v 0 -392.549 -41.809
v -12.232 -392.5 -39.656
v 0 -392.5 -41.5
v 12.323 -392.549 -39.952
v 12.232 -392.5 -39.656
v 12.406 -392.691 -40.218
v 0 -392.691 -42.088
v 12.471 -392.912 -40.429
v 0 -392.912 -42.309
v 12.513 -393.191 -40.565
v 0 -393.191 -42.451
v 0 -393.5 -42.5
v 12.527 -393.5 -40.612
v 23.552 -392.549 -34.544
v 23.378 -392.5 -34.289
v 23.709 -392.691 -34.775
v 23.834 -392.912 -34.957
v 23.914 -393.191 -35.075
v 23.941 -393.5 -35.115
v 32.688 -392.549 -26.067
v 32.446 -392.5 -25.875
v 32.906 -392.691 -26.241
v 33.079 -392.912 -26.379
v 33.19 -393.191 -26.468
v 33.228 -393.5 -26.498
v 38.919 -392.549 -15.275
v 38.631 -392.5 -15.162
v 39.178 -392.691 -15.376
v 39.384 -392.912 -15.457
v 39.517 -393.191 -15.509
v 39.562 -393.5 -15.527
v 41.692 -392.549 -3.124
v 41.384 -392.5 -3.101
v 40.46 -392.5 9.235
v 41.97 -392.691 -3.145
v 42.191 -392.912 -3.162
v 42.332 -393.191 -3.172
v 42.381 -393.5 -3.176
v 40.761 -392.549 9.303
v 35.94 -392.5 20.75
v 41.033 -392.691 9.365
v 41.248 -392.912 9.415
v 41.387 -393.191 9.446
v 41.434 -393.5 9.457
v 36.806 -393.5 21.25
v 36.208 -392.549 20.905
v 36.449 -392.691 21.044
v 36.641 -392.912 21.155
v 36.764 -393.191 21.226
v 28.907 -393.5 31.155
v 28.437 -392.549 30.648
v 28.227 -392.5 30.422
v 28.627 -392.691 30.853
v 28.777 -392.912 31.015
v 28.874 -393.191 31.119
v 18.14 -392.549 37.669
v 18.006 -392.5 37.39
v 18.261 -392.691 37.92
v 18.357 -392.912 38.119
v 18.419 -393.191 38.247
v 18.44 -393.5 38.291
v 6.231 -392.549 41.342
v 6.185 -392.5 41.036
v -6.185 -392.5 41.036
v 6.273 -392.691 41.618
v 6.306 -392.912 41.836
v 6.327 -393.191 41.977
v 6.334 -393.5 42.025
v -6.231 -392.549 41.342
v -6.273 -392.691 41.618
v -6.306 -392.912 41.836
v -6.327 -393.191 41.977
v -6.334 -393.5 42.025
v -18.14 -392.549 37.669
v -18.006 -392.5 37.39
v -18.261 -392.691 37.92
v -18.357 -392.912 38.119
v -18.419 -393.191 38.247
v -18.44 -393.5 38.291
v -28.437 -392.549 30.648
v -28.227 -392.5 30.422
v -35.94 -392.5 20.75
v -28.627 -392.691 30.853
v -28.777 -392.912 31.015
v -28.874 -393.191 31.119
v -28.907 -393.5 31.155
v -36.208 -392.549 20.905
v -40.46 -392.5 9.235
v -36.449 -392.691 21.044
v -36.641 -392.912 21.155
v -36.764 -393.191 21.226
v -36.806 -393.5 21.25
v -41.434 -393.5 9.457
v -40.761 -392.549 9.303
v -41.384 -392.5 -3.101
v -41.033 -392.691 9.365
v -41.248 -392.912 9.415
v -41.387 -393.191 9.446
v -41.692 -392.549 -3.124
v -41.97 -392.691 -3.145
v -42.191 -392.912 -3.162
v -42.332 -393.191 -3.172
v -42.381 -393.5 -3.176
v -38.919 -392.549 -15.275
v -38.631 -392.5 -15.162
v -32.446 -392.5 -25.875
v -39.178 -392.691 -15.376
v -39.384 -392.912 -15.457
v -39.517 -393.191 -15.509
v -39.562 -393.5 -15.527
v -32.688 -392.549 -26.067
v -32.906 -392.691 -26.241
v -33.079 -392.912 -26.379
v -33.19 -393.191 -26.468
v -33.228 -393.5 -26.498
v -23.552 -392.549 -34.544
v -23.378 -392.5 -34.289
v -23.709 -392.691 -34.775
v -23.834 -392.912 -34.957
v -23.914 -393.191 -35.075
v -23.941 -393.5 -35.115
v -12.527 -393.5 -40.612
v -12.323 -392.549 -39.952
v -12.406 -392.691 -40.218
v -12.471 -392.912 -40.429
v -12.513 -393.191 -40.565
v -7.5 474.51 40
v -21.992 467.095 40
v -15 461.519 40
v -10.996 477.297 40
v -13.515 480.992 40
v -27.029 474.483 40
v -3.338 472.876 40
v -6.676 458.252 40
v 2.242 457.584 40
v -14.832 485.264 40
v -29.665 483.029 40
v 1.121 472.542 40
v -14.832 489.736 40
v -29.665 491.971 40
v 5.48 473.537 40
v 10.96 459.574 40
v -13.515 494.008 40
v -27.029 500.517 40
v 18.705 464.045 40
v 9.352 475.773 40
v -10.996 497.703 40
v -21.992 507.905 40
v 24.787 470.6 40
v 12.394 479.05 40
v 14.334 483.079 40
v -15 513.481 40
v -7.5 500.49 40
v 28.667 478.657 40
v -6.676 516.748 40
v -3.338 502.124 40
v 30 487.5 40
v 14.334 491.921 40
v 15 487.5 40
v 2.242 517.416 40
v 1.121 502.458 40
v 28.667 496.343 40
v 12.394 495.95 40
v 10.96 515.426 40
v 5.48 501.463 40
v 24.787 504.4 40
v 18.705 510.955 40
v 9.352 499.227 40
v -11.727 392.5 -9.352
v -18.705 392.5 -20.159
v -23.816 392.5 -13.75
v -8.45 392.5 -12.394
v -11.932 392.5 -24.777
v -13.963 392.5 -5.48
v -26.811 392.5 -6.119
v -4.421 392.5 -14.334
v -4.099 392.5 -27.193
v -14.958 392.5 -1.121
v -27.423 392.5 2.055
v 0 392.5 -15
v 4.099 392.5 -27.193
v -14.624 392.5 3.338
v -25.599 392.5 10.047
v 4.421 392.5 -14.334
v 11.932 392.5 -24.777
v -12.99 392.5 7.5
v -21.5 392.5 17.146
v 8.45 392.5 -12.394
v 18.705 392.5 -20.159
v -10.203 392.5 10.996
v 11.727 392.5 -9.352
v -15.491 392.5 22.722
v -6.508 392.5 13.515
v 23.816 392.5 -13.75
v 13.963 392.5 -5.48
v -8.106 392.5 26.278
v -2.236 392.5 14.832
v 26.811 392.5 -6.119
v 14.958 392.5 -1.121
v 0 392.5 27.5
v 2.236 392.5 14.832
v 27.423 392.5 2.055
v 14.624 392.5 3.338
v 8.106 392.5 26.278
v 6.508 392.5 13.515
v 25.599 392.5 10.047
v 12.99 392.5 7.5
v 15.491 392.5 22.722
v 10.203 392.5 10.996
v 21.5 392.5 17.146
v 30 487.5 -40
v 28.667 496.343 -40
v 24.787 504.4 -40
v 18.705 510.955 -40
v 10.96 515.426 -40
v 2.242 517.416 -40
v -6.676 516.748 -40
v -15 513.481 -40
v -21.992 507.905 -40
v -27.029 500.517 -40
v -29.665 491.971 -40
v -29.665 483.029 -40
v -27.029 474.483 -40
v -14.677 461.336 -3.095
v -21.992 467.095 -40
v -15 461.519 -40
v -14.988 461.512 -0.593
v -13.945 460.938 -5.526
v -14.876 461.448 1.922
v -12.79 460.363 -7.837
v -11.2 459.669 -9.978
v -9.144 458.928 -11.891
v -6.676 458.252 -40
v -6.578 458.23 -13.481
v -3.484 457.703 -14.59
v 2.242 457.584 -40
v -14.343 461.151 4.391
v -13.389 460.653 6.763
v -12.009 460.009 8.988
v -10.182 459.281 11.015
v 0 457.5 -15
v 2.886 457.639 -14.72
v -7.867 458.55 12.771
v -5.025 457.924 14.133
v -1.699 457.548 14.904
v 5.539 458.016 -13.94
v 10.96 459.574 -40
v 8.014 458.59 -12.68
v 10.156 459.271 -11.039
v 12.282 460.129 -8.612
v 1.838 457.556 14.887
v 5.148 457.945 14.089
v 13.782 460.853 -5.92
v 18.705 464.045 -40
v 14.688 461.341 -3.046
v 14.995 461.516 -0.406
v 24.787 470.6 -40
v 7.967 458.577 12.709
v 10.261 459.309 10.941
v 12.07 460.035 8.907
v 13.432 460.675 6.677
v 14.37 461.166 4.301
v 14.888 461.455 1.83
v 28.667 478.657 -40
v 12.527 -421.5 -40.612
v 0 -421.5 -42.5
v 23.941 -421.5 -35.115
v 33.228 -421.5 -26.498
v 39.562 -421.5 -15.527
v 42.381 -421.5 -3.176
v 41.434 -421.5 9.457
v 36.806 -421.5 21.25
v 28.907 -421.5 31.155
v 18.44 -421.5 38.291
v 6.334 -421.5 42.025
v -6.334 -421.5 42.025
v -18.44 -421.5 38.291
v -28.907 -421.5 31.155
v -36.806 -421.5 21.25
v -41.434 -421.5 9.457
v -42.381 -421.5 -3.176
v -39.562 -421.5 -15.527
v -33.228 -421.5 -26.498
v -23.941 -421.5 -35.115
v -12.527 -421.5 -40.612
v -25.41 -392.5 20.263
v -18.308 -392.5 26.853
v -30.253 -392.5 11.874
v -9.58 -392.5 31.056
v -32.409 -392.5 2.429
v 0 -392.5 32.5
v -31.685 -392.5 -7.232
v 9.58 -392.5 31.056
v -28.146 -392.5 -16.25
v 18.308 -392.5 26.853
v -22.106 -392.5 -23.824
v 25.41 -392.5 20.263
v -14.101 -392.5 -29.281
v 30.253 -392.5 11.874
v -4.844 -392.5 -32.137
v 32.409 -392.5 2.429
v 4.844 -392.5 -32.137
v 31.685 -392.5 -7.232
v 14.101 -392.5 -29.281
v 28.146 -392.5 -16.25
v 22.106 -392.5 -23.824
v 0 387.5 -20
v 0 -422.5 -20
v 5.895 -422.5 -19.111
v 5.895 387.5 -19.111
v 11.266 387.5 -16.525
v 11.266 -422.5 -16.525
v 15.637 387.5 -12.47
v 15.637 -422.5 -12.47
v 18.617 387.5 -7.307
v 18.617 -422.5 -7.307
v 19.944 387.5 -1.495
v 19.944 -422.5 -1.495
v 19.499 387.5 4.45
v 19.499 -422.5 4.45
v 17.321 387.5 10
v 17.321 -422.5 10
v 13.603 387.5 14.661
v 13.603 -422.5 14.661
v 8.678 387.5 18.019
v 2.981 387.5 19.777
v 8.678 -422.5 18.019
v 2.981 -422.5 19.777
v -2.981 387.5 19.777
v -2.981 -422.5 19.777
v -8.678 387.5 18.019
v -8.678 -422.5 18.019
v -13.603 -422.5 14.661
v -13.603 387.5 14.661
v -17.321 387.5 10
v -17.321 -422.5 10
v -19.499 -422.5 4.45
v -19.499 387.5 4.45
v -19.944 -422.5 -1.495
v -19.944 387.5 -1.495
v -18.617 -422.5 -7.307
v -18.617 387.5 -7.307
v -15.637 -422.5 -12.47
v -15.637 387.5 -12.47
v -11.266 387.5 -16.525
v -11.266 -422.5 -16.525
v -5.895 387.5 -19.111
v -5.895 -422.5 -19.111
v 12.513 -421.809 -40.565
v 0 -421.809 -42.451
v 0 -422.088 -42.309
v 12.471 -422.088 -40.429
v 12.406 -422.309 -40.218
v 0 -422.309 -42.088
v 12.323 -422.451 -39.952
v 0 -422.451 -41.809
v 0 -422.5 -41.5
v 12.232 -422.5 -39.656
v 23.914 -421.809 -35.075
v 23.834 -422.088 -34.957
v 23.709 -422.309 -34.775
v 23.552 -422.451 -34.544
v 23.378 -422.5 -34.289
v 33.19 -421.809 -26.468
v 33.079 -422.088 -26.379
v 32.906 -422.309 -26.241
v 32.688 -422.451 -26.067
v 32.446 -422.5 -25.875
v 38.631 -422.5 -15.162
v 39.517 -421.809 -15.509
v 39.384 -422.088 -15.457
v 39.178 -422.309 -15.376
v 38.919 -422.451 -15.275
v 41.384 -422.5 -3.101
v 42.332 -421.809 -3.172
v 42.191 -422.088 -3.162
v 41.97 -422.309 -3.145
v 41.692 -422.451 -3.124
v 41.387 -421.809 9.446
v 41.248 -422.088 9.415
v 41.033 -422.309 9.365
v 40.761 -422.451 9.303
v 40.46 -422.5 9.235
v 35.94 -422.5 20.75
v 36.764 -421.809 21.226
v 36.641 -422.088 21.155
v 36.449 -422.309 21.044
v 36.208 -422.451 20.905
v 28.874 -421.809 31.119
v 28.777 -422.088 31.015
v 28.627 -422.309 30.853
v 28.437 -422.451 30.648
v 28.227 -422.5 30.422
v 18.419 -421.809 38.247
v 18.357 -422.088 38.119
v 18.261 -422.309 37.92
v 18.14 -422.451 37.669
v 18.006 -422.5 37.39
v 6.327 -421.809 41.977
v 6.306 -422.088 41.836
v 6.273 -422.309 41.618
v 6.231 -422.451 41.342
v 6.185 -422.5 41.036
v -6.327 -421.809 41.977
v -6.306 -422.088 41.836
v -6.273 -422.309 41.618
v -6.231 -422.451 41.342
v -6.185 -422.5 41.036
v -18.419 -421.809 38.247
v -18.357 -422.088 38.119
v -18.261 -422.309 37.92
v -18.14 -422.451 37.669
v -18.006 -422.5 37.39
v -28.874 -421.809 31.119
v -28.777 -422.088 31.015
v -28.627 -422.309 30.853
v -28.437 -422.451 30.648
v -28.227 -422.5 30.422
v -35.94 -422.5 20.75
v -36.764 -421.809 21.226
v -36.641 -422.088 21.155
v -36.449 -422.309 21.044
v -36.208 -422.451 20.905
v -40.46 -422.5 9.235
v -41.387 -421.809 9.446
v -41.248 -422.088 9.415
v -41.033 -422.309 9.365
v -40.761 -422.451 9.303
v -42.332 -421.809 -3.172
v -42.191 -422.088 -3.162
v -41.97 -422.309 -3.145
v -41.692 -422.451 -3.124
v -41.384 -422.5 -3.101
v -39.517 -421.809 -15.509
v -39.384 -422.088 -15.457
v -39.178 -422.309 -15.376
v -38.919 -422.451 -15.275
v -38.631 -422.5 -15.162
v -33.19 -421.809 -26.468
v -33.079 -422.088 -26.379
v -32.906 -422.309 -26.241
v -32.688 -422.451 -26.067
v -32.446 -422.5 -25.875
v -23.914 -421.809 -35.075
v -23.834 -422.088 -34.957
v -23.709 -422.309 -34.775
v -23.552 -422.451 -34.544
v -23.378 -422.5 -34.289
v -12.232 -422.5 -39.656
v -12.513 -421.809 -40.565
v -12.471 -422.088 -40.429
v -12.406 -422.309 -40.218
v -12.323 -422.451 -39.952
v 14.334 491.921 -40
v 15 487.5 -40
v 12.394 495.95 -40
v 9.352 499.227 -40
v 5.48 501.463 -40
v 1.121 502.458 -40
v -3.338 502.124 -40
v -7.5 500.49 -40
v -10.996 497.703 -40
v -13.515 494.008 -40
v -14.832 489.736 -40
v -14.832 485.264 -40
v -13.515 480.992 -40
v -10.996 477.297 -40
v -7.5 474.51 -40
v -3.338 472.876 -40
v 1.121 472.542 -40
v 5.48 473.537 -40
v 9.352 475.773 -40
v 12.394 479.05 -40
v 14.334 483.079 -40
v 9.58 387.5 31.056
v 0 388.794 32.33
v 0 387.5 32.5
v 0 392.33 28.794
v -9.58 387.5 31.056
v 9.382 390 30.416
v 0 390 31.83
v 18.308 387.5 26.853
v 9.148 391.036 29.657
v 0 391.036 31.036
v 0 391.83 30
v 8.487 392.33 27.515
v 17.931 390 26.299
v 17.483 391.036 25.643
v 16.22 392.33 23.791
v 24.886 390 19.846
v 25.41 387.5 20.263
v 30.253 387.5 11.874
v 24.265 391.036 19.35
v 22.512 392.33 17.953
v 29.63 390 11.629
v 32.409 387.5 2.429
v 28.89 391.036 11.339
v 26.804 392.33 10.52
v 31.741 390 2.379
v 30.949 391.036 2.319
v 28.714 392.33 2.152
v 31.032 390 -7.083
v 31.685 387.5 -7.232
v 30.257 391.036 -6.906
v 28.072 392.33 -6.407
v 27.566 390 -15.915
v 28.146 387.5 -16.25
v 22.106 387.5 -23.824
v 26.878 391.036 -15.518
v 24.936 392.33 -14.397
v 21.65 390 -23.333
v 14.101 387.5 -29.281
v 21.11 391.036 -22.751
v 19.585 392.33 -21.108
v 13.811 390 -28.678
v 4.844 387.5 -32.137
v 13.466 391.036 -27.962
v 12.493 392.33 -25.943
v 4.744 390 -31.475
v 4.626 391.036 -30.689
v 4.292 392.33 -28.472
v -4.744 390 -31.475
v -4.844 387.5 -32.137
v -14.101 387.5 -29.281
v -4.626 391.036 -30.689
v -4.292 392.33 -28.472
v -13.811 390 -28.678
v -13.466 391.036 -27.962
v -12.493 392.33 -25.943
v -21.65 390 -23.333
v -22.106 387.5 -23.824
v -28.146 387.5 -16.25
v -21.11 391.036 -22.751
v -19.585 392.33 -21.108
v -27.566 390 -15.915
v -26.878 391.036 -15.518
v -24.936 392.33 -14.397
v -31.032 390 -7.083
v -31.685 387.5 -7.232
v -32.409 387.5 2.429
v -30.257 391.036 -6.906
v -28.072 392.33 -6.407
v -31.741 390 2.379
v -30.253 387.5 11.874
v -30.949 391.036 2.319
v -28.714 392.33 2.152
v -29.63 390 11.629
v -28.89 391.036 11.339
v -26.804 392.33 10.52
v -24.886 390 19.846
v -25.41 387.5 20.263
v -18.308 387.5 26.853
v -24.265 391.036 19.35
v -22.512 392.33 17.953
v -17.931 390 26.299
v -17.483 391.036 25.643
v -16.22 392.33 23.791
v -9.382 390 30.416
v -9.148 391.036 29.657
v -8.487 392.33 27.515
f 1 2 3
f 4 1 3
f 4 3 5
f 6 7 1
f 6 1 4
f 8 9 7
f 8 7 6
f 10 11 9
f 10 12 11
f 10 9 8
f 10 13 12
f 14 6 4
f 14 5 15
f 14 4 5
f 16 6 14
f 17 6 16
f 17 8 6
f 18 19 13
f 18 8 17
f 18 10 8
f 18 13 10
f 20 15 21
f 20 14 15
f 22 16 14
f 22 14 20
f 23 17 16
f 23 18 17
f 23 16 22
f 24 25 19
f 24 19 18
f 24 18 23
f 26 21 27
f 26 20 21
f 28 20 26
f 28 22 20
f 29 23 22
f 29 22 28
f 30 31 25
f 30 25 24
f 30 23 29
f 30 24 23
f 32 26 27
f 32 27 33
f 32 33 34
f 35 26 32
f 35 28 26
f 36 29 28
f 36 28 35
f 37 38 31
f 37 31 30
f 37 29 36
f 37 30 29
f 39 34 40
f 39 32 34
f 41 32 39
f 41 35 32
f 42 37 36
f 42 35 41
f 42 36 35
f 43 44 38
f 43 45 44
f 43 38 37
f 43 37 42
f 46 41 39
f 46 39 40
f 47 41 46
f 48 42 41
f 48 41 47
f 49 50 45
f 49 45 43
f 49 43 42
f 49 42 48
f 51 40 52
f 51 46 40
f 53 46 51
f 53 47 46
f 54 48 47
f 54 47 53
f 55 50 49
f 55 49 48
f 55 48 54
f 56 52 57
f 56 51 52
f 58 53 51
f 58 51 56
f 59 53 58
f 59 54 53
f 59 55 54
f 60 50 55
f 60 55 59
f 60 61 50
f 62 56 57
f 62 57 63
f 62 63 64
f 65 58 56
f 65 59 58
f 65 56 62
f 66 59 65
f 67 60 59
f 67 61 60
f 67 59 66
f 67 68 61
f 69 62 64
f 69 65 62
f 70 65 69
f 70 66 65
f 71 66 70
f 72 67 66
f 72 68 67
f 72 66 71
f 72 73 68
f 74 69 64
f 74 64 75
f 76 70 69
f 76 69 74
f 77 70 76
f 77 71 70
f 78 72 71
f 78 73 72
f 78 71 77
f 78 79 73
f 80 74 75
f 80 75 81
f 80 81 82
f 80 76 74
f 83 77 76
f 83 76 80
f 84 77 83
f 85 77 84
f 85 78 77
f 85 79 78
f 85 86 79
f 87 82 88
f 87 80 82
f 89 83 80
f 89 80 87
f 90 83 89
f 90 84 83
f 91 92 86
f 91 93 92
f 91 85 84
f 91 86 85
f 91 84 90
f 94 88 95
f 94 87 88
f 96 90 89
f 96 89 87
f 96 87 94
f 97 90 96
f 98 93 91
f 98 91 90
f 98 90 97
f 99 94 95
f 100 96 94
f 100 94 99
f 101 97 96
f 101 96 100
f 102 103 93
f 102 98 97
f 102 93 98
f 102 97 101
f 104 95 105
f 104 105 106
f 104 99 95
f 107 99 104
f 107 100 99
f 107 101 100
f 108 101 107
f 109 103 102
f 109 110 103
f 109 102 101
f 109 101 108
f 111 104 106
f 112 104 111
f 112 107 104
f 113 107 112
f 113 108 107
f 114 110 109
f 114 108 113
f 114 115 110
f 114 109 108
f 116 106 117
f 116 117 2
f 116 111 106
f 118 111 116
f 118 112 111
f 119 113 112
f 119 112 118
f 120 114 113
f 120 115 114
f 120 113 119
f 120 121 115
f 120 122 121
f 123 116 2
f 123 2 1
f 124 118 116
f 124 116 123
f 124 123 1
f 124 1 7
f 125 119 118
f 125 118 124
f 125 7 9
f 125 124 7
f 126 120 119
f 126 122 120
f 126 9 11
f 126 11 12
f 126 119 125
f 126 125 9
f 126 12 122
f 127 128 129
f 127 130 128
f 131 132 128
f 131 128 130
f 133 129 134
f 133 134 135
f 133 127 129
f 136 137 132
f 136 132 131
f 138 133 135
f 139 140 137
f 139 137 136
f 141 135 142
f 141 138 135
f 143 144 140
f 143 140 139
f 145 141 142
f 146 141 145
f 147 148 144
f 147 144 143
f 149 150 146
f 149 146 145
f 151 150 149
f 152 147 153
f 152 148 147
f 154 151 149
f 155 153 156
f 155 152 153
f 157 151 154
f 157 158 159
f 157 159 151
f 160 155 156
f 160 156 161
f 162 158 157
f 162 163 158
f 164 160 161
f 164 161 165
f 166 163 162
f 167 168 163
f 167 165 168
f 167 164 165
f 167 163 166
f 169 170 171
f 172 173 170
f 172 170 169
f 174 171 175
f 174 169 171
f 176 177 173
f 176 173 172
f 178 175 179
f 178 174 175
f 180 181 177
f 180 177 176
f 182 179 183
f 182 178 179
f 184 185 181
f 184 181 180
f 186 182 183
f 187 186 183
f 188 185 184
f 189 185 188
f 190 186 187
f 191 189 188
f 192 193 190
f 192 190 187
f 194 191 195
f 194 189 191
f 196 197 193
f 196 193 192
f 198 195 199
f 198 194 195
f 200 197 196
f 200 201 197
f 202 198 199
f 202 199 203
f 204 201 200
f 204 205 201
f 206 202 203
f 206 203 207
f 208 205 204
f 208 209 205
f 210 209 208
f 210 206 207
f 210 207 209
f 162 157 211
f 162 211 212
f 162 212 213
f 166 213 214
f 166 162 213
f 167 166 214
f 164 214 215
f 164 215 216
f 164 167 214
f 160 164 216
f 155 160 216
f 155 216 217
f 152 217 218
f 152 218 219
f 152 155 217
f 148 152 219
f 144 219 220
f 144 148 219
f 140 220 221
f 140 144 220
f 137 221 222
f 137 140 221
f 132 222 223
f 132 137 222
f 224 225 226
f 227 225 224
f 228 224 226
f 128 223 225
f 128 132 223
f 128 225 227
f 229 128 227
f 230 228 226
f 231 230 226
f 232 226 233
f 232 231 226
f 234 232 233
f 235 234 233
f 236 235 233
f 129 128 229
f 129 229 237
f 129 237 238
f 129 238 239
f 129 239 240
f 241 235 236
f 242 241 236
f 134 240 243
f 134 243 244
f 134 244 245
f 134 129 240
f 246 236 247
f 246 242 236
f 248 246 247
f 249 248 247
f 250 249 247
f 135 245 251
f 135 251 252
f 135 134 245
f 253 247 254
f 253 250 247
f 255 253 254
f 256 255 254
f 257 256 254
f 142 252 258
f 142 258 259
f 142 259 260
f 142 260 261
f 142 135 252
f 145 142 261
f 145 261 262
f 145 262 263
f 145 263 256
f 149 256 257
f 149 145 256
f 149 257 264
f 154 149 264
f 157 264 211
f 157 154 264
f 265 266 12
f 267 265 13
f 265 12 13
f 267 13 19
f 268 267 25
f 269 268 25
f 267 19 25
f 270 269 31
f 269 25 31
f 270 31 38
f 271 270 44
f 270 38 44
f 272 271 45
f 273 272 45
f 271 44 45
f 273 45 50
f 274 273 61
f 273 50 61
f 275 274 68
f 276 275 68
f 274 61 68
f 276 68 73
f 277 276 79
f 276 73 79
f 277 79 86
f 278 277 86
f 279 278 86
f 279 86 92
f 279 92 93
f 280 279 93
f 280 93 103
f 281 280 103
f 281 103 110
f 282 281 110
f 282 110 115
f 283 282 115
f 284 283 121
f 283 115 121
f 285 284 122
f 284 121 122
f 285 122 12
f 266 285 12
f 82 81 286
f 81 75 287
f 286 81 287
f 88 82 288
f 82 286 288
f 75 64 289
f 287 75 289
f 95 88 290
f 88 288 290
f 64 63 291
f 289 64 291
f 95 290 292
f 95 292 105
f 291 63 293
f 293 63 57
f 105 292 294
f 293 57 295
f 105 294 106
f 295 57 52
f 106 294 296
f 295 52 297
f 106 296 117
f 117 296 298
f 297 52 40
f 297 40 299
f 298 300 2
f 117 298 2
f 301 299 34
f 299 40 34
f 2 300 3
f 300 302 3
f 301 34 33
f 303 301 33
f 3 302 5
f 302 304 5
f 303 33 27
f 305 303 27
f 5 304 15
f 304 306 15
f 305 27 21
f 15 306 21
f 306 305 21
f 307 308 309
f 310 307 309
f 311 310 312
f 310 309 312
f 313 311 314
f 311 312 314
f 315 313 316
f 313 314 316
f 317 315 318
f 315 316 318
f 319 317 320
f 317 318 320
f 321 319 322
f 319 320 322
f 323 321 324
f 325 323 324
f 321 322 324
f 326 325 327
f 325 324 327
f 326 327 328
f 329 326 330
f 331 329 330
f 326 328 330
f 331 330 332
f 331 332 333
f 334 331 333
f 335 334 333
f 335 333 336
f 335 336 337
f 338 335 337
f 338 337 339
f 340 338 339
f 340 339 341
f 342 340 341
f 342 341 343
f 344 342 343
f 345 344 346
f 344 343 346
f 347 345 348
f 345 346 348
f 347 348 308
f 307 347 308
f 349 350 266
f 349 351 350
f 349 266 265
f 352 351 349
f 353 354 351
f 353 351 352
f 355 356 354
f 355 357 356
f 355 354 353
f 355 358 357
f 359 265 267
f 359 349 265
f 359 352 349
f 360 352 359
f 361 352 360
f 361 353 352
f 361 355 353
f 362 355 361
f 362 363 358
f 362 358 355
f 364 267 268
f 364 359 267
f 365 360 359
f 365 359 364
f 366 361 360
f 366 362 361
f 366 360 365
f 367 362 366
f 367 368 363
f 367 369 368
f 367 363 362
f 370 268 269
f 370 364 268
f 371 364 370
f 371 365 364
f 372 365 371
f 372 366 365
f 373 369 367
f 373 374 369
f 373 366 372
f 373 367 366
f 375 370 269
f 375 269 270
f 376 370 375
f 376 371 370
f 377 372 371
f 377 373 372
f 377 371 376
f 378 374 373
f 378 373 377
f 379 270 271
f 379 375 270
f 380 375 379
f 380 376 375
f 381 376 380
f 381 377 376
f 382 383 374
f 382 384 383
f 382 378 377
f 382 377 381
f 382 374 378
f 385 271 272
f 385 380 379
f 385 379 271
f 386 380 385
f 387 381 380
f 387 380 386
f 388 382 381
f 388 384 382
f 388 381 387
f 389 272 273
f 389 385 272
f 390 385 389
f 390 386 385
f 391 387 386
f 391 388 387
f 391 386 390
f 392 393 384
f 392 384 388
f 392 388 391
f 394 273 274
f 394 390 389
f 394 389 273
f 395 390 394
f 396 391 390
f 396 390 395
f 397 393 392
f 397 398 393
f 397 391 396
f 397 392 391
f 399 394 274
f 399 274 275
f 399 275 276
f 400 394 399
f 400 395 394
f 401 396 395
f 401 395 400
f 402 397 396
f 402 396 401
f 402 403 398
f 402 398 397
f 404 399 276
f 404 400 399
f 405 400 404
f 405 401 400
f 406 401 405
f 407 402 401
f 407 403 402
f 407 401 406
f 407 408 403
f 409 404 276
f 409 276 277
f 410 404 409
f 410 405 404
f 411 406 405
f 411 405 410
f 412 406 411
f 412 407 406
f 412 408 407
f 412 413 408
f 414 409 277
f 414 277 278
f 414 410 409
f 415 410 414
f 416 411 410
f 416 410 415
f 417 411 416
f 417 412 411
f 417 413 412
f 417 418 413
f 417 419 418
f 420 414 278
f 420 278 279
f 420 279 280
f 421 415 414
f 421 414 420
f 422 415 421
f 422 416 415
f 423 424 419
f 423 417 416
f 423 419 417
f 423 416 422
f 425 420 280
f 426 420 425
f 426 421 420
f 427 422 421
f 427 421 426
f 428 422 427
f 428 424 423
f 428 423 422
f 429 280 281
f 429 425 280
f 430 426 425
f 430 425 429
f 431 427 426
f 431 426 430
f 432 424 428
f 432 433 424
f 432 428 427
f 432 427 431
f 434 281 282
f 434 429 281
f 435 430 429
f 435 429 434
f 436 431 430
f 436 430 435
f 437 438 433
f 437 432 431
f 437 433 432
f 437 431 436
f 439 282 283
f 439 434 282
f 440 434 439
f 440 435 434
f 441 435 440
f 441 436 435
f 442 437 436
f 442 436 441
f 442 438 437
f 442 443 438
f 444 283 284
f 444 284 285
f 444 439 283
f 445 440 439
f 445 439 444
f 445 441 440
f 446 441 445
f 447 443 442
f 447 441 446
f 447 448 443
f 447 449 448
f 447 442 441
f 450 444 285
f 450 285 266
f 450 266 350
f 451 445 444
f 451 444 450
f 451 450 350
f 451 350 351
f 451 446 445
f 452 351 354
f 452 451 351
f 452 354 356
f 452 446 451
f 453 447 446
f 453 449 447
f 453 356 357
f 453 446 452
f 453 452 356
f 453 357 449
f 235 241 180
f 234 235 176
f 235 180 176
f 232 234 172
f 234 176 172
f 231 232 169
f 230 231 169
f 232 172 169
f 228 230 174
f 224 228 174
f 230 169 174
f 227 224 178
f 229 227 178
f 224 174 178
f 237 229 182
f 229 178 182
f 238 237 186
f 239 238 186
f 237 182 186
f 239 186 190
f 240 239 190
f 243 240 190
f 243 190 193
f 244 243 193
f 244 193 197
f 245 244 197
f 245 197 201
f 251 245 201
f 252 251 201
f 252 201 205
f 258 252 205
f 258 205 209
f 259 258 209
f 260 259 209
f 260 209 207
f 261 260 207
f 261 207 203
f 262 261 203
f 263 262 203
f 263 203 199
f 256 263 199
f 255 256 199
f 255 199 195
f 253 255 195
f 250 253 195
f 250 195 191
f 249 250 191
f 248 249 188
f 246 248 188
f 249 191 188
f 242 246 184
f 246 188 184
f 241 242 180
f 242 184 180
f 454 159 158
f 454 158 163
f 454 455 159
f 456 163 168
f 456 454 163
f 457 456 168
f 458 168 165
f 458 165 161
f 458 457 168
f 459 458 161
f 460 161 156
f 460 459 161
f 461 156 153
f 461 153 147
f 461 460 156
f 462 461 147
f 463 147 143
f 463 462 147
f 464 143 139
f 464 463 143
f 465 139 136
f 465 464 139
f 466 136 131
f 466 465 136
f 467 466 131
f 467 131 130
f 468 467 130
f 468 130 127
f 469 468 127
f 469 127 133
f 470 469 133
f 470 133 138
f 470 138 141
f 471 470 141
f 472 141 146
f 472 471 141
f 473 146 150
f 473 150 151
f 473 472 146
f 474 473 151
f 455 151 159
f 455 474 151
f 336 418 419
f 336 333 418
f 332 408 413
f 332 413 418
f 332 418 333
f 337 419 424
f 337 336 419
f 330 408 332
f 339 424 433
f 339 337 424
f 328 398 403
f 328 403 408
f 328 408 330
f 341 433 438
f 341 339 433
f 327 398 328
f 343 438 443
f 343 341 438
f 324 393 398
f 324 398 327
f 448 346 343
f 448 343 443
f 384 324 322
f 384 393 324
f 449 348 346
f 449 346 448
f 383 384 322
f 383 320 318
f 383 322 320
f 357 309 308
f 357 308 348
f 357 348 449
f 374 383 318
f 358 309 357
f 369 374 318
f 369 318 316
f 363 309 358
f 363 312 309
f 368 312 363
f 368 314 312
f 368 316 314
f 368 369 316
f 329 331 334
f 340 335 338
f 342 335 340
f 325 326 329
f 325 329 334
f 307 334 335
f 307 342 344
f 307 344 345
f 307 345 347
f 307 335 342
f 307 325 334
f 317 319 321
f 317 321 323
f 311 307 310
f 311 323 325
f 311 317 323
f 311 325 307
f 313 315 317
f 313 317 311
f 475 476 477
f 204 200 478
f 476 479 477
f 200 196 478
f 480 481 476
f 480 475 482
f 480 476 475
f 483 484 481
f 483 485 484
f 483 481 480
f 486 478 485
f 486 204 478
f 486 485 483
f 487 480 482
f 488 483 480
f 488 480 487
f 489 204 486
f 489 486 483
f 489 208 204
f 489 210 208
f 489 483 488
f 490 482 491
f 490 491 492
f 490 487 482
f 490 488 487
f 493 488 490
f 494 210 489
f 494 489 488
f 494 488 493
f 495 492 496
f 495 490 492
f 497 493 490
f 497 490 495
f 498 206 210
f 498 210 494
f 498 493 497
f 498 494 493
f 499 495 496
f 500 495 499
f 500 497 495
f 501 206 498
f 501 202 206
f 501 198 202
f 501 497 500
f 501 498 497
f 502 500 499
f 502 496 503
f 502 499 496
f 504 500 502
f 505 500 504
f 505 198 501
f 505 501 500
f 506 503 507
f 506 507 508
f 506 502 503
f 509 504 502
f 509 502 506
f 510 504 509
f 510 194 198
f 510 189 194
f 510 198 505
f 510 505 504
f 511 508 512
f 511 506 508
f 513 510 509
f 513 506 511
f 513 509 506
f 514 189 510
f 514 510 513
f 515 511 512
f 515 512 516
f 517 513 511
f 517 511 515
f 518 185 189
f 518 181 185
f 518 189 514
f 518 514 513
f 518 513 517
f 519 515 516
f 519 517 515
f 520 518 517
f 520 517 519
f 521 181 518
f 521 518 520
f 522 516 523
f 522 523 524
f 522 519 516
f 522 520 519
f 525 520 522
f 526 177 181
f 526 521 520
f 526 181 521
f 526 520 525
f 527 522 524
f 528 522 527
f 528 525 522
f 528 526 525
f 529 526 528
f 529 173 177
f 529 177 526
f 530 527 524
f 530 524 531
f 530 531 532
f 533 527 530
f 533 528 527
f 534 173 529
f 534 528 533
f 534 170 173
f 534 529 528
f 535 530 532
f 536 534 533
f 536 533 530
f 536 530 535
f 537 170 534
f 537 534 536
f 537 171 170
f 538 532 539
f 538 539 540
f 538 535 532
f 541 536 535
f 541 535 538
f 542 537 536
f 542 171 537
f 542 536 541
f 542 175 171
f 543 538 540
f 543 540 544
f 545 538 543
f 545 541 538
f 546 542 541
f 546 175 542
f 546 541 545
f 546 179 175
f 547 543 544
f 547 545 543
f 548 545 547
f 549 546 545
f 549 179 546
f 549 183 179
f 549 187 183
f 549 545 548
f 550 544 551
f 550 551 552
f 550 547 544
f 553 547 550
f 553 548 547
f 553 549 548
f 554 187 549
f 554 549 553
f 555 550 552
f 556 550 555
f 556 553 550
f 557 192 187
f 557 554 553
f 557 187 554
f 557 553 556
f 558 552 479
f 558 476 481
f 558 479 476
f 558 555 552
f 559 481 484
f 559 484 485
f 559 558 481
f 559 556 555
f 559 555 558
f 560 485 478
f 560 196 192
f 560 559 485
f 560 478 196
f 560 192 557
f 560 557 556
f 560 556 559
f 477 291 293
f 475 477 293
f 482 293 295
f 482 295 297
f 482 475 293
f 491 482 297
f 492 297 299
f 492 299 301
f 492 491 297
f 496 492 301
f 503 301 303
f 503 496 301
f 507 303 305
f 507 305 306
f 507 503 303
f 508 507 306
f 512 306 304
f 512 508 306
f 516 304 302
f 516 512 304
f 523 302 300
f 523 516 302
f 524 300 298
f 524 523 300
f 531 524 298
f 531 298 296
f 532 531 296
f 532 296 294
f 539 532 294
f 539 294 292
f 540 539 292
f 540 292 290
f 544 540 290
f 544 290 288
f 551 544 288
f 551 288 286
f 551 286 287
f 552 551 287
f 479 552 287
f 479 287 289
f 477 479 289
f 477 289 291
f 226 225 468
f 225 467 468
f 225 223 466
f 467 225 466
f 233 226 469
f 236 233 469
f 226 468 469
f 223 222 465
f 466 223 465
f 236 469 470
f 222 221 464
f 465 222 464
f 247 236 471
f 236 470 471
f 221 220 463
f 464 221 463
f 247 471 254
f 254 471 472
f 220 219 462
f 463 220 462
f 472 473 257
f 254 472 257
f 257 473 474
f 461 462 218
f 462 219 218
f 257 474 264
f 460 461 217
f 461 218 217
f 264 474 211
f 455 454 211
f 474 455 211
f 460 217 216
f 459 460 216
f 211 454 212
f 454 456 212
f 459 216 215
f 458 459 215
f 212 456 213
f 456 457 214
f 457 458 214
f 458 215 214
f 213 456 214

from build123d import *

# Parameters (mm, degrees)
SKETCH1_R                = 32.5
BOSS_EXTRUDE1_DEPTH      = 392.5
FILLET1_R                = 5
SKETCH2_R                = 42.5
BOSS_EXTRUDE2_DEPTH      = 30
SKETCH3_R                = 20
CUT_EXTRUDE1_DEPTH       = 810
SKETCH4_R                = 30
SKETCH4_R_2              = 15
BOSS_EXTRUDE3_DEPTH      = 40
BOSS_EXTRUDE4_REACH      = 819.213
BOSS_EXTRUDE4_END_RADIUS = 30
SKETCH5_R                = 15
FILLET2_R                = 1


with BuildPart() as part:
    # Sketch1 → Boss-Extrude1 (new, symmetric)
    with BuildSketch(Plane(origin=(0, 0, 0), x_dir=(1, 0, 0), z_dir=(0, 1, 0))):
        with Locations(Location((0, 0, 0), (0, 0, 270))):
            Circle(SKETCH1_R)
    extrude(amount=BOSS_EXTRUDE1_DEPTH, both=True)

    # Fillet1
    fillet1_edges = [part.edges().sort_by_distance(p)[0] for p in [
        (0, 392.5, -32.5),
    ]]
    fillet(fillet1_edges, radius=FILLET1_R)

    # Sketch2 → Boss-Extrude2 (add)
    with BuildSketch(Plane.XZ.offset(392.5)):
        with Locations(Location((0, 0, 0), (0, 0, 270))):
            Circle(SKETCH2_R)
    extrude(amount=BOSS_EXTRUDE2_DEPTH)

    # Sketch3 → Cut-Extrude1 (cut)
    with BuildSketch(Plane.XZ.offset(422.5)):
        with Locations(Location((0, 0, 0), (0, 0, 270))):
            Circle(SKETCH3_R)
    extrude(amount=-CUT_EXTRUDE1_DEPTH, mode=Mode.SUBTRACT)



with BuildPart() as body_2:
    # Sketch4 → Boss-Extrude3 (new, symmetric)
    with BuildSketch(Plane.XY):
        with Locations((0, 487.5)):
            Circle(SKETCH4_R)
        with Locations((0, 487.5)):
            Circle(SKETCH4_R_2, mode=Mode.SUBTRACT)
    extrude(amount=BOSS_EXTRUDE3_DEPTH, both=True)


with BuildPart() as part_1:
    add(part.part)

    add(body_2.part)  # Boss-Extrude4 merges body 2
    # Boss-Extrude4: up to this cylinder (the profile starts outside it)
    boss_extrude4_end = Plane(origin=(0, 487.5, 0), z_dir=(0, 0, -1)) * Cylinder(BOSS_EXTRUDE4_END_RADIUS, 1699.426, mode=Mode.PRIVATE)
    # Sketch5 → Boss-Extrude4 (add, up to the surface)
    with BuildSketch(Plane(origin=(0, 392.5, 0), x_dir=(1, 0, 0), z_dir=(0, 1, 0)), mode=Mode.PRIVATE) as boss_extrude4_sk1:
        with Locations(Location((0, 0, 0), (0, 0, 90))):
            Circle(SKETCH5_R)
    boss_extrude4_tool1 = extrude(boss_extrude4_sk1.sketch, amount=BOSS_EXTRUDE4_REACH, mode=Mode.PRIVATE) - boss_extrude4_end
    add(boss_extrude4_tool1.solids().sort_by_distance((0, 392.5, 0))[0])

    # Fillet2
    fillet2_edges = [part_1.edges().sort_by_distance(p)[0] for p in [
        (0, -392.5, 42.5),
        (0, -422.5, 42.5),
    ]]
    fillet(fillet2_edges, radius=FILLET2_R)


solid = part_1.part
